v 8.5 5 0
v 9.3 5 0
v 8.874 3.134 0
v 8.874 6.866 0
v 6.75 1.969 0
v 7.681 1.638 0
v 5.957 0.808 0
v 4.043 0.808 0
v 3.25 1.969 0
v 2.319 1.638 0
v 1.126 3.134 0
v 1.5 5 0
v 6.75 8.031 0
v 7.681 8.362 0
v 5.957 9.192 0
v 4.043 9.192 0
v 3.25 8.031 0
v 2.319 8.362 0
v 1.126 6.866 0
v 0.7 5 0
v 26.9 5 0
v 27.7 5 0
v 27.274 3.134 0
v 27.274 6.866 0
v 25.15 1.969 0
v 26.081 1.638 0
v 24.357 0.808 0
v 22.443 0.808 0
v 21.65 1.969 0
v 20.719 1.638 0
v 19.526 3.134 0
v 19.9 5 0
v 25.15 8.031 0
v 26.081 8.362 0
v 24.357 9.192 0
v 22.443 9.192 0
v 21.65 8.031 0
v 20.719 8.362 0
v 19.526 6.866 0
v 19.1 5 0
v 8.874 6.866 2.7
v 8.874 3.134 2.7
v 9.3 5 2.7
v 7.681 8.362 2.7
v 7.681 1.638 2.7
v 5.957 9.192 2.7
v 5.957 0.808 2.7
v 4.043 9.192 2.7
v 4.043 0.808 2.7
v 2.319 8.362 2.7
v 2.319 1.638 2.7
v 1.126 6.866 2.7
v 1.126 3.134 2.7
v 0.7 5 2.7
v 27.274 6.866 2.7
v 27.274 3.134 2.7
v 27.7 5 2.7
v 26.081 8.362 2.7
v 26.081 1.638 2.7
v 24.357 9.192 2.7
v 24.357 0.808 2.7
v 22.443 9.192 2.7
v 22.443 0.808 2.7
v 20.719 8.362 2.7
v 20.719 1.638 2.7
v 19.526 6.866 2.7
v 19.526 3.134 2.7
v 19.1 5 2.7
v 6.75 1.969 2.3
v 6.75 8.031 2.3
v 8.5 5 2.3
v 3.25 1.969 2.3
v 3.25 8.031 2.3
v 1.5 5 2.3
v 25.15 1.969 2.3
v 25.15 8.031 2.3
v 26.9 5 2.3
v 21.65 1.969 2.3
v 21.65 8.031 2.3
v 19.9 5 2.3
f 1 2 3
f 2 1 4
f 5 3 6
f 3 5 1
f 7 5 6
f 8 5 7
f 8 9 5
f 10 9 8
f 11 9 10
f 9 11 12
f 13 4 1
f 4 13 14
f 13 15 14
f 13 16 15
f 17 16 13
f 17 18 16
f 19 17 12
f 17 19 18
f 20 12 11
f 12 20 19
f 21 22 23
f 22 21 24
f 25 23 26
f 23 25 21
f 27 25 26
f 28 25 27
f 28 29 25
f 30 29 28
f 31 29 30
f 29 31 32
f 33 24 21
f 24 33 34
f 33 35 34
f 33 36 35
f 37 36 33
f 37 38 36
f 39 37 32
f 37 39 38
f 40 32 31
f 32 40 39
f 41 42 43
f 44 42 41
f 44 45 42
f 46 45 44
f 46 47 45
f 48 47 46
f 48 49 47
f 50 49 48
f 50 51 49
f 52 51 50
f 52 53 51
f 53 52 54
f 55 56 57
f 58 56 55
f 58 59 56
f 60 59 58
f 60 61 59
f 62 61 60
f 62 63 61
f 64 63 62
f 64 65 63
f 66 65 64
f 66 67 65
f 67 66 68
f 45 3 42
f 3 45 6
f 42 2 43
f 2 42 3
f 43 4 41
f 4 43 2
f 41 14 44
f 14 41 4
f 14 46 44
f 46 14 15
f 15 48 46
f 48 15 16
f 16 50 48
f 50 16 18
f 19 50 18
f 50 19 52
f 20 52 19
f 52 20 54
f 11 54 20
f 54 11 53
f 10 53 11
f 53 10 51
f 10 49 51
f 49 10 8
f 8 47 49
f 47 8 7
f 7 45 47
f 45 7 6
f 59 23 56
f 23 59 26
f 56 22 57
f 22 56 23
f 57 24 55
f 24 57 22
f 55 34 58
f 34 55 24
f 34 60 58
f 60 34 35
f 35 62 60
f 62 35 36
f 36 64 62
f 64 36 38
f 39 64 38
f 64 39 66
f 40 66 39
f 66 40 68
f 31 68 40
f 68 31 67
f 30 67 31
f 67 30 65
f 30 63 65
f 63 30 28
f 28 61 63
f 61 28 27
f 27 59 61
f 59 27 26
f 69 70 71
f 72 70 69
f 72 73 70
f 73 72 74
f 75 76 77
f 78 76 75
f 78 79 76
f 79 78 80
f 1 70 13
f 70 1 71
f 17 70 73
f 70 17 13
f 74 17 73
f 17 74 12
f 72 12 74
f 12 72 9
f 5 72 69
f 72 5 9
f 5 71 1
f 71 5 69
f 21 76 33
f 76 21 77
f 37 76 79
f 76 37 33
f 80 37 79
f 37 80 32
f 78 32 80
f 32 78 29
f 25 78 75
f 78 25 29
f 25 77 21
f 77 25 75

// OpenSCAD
// Copyright (C) 2025 Arif K. Rafiq
// This program is free software: you can redistribute it and/or modify
// it under the terms of the GNU General Public License as published by
// the Free Software Foundation, either version 3 of the License, or
// (at your option) any later version.

// This program is distributed in the hope that it will be useful,
// but WITHOUT ANY WARRANTY; without even the implied warranty of
// MERCHANTABILITY or FITNESS FOR A PARTICULAR PURPOSE.  See the
// GNU General Public License for more details.

// You should have received a copy of the GNU General Public License
// along with this file.  If not, see <https://www.gnu.org/licenses/>,
// or write to: license@temperedoptimism.com


// NOTHING SHOWS
// Fixed in example3.scad

tWallMin = 0.40;         // Limit for 3D printer, I have 0.2
pHexSink = [3.5, 2.3];
vTerminal0 = [5.0, 5.0];
vTerminal1 = [23.4, 5.0];

//19:31
difference(){
  // hex pocket surround
                             // We added tWallMin and there is an issue
                             // By moving around you can still see the hex hole.
  linear_extrude(pHexSink.y+ tWallMin){  
    translate(vTerminal0)  circle(pHexSink.x +(tWallMin *2));
    translate(vTerminal1)  circle(pHexSink.x +(tWallMin *2));
  }
  
  linear_extrude(pHexSink.y){
      translate(vTerminal0)  circle(pHexSink.x, $fn=6);
      translate(vTerminal1)  circle(pHexSink.x, $fn=6);
  }
}
